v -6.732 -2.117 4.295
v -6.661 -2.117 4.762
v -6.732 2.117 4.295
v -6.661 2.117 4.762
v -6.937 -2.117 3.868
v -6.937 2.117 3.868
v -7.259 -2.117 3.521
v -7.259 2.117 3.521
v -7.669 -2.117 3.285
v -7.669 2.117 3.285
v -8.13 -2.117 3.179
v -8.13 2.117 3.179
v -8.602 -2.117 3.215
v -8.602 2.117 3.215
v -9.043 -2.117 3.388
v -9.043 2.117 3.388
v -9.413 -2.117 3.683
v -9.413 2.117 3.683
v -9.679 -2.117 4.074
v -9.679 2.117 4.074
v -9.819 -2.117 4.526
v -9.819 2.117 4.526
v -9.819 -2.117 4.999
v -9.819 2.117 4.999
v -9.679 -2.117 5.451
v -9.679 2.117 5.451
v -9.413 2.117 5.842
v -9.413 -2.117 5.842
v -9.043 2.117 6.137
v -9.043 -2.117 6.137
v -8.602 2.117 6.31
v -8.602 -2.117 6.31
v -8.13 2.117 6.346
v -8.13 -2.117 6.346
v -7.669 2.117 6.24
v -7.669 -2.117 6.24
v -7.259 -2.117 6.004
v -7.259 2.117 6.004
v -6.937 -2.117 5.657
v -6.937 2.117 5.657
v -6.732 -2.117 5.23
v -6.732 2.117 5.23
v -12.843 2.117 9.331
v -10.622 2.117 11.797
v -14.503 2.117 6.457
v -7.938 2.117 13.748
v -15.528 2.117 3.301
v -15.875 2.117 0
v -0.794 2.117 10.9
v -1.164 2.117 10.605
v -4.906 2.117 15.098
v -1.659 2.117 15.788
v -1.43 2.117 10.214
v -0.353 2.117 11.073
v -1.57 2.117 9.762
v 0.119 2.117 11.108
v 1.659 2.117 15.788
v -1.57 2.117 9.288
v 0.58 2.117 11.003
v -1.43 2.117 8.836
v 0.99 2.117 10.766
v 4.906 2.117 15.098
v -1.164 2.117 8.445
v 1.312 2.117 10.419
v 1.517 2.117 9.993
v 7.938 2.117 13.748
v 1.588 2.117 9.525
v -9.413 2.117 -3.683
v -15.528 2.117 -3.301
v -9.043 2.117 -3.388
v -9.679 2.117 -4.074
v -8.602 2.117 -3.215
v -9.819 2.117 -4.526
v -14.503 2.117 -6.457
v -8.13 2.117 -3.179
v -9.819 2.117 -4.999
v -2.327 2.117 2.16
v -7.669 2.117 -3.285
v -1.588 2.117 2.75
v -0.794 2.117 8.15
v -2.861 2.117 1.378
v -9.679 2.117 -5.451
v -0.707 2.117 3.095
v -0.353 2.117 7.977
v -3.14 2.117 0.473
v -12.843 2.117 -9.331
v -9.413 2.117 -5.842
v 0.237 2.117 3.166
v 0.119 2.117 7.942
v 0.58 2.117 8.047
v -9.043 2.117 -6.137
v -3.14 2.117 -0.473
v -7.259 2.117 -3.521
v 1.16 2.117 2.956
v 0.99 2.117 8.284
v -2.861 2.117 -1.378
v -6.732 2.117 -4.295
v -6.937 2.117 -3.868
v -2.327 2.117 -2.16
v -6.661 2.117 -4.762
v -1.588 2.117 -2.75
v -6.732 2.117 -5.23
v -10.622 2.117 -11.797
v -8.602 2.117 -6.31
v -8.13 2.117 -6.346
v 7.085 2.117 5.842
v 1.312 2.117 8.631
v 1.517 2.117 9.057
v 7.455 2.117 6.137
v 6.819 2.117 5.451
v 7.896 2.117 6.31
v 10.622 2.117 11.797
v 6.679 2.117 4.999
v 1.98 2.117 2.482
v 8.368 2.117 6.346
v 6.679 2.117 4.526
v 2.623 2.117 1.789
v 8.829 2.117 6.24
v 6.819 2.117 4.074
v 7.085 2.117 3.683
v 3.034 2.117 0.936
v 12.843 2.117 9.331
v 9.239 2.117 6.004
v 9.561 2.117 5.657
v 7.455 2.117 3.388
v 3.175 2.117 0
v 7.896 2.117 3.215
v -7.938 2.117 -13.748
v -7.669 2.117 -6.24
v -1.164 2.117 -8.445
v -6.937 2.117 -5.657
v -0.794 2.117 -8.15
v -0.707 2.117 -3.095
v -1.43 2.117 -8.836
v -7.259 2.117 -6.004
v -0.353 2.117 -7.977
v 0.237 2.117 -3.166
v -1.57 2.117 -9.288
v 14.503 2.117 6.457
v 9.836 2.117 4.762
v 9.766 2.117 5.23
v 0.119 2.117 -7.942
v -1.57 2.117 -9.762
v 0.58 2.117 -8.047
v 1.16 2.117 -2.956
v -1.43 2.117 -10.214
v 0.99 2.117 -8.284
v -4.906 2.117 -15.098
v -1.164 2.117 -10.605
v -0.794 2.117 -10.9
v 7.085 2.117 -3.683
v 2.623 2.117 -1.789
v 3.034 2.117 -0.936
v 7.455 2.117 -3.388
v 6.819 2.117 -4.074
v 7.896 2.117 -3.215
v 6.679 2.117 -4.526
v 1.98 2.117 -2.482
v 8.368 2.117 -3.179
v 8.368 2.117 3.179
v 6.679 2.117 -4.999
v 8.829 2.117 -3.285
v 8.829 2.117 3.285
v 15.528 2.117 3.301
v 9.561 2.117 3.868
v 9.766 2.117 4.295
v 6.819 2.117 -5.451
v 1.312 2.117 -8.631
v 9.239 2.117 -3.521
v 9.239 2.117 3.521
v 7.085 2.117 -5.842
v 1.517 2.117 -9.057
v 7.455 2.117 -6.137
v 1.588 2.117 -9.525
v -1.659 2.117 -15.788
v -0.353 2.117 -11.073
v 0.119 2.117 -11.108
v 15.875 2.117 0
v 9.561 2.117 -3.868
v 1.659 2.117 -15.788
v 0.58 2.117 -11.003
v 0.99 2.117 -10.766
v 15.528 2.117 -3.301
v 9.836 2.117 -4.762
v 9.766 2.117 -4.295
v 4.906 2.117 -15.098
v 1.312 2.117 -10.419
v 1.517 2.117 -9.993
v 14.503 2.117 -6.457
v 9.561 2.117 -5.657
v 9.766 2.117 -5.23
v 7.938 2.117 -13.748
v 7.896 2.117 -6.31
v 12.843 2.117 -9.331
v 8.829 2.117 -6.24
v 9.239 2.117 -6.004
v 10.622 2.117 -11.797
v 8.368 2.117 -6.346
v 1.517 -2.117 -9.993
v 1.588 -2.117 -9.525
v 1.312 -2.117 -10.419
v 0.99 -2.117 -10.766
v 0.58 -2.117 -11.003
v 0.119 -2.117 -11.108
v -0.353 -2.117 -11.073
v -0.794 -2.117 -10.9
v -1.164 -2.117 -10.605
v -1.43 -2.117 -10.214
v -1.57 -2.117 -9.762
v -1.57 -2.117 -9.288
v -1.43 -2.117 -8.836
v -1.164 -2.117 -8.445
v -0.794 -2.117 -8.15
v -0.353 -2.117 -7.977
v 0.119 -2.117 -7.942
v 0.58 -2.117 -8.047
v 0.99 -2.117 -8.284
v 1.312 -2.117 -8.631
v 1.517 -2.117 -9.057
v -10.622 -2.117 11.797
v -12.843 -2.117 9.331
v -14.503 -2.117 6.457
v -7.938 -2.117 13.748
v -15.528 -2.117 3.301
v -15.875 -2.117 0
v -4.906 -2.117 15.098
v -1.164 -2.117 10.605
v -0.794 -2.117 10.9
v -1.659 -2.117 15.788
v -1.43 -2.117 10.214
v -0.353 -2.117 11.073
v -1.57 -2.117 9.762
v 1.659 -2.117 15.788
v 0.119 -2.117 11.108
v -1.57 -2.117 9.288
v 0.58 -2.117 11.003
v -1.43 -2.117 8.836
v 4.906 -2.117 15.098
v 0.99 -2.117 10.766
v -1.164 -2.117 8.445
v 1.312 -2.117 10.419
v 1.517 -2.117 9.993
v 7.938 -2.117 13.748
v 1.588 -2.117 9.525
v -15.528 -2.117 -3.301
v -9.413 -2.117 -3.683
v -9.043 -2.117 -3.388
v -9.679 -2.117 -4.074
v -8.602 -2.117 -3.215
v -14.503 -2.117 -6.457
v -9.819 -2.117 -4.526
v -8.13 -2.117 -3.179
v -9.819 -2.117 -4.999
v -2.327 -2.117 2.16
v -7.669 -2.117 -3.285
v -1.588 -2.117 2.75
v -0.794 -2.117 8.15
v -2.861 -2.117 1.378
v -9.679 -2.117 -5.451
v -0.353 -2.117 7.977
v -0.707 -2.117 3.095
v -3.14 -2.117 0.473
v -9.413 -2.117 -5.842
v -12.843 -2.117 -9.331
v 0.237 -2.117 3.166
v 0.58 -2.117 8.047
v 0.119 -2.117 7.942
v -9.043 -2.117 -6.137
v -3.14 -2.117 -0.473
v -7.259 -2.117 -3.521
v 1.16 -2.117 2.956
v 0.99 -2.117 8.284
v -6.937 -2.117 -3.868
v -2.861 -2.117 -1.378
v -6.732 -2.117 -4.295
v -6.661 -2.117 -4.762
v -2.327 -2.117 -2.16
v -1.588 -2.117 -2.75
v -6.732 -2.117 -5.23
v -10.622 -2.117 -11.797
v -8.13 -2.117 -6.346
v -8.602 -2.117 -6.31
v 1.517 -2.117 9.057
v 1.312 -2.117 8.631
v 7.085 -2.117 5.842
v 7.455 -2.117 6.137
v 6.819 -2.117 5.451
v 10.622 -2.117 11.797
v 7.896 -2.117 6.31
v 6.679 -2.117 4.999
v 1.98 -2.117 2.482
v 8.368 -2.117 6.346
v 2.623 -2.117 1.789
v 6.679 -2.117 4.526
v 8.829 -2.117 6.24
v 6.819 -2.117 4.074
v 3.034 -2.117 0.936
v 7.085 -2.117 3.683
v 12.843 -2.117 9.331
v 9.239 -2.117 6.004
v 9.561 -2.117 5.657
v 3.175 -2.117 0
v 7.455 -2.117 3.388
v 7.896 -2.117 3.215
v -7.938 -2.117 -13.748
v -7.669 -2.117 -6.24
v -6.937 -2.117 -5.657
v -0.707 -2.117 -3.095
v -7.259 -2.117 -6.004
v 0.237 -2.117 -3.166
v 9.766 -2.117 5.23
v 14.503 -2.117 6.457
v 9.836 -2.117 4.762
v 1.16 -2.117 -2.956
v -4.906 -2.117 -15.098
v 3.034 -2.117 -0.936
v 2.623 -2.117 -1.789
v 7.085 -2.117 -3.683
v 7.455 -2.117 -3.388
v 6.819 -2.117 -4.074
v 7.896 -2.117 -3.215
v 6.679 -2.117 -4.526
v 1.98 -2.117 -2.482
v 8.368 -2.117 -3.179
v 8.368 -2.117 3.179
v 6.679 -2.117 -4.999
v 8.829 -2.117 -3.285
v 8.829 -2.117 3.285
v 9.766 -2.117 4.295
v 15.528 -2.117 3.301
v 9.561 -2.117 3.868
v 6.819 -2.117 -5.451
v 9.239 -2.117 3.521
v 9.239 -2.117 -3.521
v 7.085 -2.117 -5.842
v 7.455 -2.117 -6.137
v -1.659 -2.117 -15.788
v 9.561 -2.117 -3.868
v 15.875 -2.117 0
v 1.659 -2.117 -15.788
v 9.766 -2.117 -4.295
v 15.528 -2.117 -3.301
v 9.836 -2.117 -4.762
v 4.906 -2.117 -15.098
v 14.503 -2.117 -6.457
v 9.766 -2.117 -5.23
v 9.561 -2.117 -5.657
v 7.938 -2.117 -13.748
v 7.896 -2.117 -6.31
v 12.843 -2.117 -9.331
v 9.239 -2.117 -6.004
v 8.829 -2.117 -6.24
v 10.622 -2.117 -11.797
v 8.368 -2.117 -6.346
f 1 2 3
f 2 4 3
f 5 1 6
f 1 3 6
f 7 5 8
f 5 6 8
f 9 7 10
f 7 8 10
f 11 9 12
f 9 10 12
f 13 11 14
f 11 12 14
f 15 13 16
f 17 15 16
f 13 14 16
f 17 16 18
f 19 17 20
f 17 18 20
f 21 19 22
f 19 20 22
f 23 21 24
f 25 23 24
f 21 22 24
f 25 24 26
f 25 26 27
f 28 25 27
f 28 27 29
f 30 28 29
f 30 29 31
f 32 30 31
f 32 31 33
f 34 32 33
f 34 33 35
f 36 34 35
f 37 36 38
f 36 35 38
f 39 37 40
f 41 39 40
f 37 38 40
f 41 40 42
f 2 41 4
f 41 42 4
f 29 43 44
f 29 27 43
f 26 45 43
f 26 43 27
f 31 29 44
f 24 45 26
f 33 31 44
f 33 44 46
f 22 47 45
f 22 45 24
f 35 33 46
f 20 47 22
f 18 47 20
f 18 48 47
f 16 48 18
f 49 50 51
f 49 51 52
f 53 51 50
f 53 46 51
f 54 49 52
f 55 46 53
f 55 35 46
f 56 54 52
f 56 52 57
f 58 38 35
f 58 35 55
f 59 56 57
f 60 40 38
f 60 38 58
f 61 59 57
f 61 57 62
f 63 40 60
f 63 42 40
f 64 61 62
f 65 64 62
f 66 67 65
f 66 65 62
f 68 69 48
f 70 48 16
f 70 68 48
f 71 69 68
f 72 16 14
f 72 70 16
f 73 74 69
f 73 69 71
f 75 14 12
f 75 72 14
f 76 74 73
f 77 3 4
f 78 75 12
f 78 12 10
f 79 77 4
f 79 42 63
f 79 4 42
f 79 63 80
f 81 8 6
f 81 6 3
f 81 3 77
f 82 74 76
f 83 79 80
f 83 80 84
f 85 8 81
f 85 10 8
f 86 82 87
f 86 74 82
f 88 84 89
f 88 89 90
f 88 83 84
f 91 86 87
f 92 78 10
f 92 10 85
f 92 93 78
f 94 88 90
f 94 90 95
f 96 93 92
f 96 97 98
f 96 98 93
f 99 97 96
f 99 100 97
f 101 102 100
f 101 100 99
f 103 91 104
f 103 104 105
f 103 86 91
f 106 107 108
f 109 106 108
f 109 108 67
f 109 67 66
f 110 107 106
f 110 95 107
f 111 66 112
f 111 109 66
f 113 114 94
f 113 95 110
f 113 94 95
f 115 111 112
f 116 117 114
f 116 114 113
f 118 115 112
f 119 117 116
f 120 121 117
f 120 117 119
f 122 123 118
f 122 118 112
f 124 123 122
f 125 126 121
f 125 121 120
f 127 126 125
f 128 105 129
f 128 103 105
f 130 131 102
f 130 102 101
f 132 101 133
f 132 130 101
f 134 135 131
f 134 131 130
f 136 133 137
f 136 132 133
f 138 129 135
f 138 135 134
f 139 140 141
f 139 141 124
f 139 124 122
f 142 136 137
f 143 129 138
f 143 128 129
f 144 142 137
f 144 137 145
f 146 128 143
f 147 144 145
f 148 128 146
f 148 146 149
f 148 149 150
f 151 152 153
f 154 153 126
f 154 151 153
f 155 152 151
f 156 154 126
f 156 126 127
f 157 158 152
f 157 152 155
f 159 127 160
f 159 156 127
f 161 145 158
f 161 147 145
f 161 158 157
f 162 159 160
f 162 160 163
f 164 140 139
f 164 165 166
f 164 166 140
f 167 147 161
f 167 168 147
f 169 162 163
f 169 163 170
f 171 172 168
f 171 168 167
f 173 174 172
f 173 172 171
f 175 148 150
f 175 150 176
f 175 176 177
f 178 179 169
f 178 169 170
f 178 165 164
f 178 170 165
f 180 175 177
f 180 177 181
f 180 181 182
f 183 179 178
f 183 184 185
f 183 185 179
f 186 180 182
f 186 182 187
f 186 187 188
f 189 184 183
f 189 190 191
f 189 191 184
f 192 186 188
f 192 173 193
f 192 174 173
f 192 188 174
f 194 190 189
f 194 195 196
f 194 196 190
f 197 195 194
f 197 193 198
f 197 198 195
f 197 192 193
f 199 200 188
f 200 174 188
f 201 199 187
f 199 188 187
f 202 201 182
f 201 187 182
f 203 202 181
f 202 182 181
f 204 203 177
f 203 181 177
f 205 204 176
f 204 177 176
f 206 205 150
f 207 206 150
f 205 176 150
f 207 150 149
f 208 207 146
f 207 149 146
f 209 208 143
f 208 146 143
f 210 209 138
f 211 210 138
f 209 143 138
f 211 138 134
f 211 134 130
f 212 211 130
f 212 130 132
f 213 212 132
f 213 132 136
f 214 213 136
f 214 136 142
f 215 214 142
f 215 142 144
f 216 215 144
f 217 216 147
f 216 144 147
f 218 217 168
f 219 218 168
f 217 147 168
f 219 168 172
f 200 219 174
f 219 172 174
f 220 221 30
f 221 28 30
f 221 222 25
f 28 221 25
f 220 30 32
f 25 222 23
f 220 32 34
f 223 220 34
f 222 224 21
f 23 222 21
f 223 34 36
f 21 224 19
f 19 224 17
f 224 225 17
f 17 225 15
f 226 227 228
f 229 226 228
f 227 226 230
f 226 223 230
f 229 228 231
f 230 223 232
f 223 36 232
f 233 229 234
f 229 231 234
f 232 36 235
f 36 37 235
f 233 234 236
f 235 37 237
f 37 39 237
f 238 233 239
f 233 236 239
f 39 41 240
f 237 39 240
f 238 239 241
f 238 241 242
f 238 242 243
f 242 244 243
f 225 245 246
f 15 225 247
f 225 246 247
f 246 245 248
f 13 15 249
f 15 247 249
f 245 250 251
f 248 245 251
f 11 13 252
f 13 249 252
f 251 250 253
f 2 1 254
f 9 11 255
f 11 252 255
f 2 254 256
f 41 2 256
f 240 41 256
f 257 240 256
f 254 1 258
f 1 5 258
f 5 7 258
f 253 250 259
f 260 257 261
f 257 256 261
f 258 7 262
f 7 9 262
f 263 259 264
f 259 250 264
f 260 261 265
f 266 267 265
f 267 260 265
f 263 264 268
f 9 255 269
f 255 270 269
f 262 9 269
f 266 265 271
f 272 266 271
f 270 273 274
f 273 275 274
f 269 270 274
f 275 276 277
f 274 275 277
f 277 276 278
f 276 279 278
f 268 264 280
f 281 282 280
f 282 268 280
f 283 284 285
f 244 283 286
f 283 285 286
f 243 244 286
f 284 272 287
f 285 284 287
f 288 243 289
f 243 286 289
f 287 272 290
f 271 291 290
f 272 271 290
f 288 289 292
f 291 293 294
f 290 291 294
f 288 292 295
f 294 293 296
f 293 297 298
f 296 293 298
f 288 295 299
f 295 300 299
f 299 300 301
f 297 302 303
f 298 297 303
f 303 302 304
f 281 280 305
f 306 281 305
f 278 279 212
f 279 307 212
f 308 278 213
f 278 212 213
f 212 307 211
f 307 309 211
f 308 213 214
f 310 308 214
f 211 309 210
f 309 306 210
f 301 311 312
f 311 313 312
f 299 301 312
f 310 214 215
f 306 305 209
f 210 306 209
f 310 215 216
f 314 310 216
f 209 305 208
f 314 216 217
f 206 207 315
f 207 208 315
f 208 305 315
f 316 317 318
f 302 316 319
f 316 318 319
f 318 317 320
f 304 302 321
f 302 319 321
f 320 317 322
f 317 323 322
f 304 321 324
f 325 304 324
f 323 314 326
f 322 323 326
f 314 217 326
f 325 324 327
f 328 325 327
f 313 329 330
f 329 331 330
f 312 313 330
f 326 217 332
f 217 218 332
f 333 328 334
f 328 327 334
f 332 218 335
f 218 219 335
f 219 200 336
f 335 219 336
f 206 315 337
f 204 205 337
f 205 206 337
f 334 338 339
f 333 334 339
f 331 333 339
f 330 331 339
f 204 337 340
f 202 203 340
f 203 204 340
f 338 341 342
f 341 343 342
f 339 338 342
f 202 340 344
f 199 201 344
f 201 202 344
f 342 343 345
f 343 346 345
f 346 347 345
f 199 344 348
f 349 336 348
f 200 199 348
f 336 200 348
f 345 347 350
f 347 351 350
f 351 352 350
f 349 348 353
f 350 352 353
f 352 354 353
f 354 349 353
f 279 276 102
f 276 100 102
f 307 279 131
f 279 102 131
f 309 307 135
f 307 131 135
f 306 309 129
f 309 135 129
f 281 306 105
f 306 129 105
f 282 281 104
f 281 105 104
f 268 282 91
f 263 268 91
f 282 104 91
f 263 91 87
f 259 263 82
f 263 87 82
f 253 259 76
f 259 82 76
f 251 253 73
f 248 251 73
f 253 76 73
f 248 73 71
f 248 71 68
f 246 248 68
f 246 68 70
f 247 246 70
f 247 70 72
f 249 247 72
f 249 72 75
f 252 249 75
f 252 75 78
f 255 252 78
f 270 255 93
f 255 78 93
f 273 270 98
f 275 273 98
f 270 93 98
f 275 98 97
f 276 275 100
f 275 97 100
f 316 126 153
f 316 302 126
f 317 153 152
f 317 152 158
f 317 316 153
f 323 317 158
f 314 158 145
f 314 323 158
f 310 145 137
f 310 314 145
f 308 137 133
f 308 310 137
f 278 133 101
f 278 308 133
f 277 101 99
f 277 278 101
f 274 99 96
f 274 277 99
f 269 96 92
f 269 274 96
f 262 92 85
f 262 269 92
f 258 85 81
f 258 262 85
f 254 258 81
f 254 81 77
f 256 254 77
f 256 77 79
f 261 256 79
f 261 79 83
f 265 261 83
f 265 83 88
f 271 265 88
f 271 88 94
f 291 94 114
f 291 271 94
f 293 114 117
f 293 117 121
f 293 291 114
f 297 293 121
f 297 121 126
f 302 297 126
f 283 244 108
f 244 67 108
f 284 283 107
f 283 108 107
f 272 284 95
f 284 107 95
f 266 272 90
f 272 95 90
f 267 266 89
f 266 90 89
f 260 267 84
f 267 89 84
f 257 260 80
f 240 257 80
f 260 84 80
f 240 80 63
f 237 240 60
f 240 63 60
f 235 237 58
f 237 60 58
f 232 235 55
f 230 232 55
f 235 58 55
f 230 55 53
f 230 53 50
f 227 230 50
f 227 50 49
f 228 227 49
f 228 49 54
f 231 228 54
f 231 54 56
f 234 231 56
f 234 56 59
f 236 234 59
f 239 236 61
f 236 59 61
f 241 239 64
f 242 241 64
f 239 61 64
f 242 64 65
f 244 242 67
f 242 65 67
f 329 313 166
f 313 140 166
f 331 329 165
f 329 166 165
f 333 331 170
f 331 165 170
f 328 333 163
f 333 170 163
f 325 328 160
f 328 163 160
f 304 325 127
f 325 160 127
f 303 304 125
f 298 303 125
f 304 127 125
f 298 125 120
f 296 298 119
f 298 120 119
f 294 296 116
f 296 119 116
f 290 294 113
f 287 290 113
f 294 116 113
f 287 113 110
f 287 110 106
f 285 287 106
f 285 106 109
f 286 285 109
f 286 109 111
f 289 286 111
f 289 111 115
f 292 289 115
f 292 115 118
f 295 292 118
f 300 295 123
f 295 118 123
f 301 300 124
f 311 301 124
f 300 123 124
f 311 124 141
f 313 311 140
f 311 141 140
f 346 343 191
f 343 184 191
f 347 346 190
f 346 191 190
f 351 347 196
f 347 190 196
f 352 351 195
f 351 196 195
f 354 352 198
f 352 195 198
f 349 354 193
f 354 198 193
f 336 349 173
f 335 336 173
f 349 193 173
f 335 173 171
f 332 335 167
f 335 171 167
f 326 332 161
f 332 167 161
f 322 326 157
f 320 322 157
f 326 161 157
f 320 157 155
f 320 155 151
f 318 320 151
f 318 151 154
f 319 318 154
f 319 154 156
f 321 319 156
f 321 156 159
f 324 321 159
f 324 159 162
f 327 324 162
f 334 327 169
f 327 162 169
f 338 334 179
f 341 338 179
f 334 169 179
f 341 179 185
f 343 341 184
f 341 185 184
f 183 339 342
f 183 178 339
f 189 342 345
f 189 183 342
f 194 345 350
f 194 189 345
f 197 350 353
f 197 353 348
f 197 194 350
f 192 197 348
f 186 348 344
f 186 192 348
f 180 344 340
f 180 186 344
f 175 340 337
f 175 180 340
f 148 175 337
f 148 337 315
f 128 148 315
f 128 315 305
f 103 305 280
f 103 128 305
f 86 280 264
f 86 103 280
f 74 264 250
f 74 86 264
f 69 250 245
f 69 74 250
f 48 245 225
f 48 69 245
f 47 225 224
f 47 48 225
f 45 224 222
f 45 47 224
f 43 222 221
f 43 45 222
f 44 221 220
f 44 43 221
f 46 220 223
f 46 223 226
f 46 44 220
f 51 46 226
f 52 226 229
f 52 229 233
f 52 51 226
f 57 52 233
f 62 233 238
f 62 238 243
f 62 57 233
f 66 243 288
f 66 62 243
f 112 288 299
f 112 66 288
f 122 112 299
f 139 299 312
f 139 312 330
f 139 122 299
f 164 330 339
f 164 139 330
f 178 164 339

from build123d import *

# Parameters (mm, degrees)
SKETCH1_R               = 15.875
SKETCH1_R_2             = 3.175
BOSS_EXTRUDE1_DEPTH     = 2.116666667
SKETCH2_R               = 1.5875
CUT_EXTRUDE1_DEPTH      = 3.116666667
CUT_EXTRUDE1_DEPTH_BACK = 3.116666667


with BuildPart() as part:
    # Sketch1 → Boss-Extrude1 (new body, symmetric)
    with BuildSketch(Plane(origin=(0, 0, 0), x_dir=(1, 0, 0), z_dir=(0, 1, 0))):
        Circle(SKETCH1_R)
        Circle(SKETCH1_R_2, mode=Mode.SUBTRACT)
    extrude(amount=BOSS_EXTRUDE1_DEPTH, both=True)

    # Sketch2 → Cut-Extrude1 (cut, two sides)
    with BuildSketch(Plane(origin=(0, 0, 0), x_dir=(1, 0, 0), z_dir=(0, 1, 0))) as cut_extrude1_sk:
        with Locations((0, 9.525)):
            Circle(SKETCH2_R)
        with Locations((8.248891971, 4.7625)):
            Circle(SKETCH2_R)
        with Locations((8.248891971, -4.7625)):
            Circle(SKETCH2_R)
        with Locations((0, -9.525)):
            Circle(SKETCH2_R)
        with Locations((-8.248891971, -4.7625)):
            Circle(SKETCH2_R)
        with Locations((-8.248891971, 4.7625)):
            Circle(SKETCH2_R)
    extrude(amount=CUT_EXTRUDE1_DEPTH, mode=Mode.SUBTRACT)
    extrude(cut_extrude1_sk.sketch, amount=-CUT_EXTRUDE1_DEPTH_BACK, mode=Mode.SUBTRACT)


solid = part.part
